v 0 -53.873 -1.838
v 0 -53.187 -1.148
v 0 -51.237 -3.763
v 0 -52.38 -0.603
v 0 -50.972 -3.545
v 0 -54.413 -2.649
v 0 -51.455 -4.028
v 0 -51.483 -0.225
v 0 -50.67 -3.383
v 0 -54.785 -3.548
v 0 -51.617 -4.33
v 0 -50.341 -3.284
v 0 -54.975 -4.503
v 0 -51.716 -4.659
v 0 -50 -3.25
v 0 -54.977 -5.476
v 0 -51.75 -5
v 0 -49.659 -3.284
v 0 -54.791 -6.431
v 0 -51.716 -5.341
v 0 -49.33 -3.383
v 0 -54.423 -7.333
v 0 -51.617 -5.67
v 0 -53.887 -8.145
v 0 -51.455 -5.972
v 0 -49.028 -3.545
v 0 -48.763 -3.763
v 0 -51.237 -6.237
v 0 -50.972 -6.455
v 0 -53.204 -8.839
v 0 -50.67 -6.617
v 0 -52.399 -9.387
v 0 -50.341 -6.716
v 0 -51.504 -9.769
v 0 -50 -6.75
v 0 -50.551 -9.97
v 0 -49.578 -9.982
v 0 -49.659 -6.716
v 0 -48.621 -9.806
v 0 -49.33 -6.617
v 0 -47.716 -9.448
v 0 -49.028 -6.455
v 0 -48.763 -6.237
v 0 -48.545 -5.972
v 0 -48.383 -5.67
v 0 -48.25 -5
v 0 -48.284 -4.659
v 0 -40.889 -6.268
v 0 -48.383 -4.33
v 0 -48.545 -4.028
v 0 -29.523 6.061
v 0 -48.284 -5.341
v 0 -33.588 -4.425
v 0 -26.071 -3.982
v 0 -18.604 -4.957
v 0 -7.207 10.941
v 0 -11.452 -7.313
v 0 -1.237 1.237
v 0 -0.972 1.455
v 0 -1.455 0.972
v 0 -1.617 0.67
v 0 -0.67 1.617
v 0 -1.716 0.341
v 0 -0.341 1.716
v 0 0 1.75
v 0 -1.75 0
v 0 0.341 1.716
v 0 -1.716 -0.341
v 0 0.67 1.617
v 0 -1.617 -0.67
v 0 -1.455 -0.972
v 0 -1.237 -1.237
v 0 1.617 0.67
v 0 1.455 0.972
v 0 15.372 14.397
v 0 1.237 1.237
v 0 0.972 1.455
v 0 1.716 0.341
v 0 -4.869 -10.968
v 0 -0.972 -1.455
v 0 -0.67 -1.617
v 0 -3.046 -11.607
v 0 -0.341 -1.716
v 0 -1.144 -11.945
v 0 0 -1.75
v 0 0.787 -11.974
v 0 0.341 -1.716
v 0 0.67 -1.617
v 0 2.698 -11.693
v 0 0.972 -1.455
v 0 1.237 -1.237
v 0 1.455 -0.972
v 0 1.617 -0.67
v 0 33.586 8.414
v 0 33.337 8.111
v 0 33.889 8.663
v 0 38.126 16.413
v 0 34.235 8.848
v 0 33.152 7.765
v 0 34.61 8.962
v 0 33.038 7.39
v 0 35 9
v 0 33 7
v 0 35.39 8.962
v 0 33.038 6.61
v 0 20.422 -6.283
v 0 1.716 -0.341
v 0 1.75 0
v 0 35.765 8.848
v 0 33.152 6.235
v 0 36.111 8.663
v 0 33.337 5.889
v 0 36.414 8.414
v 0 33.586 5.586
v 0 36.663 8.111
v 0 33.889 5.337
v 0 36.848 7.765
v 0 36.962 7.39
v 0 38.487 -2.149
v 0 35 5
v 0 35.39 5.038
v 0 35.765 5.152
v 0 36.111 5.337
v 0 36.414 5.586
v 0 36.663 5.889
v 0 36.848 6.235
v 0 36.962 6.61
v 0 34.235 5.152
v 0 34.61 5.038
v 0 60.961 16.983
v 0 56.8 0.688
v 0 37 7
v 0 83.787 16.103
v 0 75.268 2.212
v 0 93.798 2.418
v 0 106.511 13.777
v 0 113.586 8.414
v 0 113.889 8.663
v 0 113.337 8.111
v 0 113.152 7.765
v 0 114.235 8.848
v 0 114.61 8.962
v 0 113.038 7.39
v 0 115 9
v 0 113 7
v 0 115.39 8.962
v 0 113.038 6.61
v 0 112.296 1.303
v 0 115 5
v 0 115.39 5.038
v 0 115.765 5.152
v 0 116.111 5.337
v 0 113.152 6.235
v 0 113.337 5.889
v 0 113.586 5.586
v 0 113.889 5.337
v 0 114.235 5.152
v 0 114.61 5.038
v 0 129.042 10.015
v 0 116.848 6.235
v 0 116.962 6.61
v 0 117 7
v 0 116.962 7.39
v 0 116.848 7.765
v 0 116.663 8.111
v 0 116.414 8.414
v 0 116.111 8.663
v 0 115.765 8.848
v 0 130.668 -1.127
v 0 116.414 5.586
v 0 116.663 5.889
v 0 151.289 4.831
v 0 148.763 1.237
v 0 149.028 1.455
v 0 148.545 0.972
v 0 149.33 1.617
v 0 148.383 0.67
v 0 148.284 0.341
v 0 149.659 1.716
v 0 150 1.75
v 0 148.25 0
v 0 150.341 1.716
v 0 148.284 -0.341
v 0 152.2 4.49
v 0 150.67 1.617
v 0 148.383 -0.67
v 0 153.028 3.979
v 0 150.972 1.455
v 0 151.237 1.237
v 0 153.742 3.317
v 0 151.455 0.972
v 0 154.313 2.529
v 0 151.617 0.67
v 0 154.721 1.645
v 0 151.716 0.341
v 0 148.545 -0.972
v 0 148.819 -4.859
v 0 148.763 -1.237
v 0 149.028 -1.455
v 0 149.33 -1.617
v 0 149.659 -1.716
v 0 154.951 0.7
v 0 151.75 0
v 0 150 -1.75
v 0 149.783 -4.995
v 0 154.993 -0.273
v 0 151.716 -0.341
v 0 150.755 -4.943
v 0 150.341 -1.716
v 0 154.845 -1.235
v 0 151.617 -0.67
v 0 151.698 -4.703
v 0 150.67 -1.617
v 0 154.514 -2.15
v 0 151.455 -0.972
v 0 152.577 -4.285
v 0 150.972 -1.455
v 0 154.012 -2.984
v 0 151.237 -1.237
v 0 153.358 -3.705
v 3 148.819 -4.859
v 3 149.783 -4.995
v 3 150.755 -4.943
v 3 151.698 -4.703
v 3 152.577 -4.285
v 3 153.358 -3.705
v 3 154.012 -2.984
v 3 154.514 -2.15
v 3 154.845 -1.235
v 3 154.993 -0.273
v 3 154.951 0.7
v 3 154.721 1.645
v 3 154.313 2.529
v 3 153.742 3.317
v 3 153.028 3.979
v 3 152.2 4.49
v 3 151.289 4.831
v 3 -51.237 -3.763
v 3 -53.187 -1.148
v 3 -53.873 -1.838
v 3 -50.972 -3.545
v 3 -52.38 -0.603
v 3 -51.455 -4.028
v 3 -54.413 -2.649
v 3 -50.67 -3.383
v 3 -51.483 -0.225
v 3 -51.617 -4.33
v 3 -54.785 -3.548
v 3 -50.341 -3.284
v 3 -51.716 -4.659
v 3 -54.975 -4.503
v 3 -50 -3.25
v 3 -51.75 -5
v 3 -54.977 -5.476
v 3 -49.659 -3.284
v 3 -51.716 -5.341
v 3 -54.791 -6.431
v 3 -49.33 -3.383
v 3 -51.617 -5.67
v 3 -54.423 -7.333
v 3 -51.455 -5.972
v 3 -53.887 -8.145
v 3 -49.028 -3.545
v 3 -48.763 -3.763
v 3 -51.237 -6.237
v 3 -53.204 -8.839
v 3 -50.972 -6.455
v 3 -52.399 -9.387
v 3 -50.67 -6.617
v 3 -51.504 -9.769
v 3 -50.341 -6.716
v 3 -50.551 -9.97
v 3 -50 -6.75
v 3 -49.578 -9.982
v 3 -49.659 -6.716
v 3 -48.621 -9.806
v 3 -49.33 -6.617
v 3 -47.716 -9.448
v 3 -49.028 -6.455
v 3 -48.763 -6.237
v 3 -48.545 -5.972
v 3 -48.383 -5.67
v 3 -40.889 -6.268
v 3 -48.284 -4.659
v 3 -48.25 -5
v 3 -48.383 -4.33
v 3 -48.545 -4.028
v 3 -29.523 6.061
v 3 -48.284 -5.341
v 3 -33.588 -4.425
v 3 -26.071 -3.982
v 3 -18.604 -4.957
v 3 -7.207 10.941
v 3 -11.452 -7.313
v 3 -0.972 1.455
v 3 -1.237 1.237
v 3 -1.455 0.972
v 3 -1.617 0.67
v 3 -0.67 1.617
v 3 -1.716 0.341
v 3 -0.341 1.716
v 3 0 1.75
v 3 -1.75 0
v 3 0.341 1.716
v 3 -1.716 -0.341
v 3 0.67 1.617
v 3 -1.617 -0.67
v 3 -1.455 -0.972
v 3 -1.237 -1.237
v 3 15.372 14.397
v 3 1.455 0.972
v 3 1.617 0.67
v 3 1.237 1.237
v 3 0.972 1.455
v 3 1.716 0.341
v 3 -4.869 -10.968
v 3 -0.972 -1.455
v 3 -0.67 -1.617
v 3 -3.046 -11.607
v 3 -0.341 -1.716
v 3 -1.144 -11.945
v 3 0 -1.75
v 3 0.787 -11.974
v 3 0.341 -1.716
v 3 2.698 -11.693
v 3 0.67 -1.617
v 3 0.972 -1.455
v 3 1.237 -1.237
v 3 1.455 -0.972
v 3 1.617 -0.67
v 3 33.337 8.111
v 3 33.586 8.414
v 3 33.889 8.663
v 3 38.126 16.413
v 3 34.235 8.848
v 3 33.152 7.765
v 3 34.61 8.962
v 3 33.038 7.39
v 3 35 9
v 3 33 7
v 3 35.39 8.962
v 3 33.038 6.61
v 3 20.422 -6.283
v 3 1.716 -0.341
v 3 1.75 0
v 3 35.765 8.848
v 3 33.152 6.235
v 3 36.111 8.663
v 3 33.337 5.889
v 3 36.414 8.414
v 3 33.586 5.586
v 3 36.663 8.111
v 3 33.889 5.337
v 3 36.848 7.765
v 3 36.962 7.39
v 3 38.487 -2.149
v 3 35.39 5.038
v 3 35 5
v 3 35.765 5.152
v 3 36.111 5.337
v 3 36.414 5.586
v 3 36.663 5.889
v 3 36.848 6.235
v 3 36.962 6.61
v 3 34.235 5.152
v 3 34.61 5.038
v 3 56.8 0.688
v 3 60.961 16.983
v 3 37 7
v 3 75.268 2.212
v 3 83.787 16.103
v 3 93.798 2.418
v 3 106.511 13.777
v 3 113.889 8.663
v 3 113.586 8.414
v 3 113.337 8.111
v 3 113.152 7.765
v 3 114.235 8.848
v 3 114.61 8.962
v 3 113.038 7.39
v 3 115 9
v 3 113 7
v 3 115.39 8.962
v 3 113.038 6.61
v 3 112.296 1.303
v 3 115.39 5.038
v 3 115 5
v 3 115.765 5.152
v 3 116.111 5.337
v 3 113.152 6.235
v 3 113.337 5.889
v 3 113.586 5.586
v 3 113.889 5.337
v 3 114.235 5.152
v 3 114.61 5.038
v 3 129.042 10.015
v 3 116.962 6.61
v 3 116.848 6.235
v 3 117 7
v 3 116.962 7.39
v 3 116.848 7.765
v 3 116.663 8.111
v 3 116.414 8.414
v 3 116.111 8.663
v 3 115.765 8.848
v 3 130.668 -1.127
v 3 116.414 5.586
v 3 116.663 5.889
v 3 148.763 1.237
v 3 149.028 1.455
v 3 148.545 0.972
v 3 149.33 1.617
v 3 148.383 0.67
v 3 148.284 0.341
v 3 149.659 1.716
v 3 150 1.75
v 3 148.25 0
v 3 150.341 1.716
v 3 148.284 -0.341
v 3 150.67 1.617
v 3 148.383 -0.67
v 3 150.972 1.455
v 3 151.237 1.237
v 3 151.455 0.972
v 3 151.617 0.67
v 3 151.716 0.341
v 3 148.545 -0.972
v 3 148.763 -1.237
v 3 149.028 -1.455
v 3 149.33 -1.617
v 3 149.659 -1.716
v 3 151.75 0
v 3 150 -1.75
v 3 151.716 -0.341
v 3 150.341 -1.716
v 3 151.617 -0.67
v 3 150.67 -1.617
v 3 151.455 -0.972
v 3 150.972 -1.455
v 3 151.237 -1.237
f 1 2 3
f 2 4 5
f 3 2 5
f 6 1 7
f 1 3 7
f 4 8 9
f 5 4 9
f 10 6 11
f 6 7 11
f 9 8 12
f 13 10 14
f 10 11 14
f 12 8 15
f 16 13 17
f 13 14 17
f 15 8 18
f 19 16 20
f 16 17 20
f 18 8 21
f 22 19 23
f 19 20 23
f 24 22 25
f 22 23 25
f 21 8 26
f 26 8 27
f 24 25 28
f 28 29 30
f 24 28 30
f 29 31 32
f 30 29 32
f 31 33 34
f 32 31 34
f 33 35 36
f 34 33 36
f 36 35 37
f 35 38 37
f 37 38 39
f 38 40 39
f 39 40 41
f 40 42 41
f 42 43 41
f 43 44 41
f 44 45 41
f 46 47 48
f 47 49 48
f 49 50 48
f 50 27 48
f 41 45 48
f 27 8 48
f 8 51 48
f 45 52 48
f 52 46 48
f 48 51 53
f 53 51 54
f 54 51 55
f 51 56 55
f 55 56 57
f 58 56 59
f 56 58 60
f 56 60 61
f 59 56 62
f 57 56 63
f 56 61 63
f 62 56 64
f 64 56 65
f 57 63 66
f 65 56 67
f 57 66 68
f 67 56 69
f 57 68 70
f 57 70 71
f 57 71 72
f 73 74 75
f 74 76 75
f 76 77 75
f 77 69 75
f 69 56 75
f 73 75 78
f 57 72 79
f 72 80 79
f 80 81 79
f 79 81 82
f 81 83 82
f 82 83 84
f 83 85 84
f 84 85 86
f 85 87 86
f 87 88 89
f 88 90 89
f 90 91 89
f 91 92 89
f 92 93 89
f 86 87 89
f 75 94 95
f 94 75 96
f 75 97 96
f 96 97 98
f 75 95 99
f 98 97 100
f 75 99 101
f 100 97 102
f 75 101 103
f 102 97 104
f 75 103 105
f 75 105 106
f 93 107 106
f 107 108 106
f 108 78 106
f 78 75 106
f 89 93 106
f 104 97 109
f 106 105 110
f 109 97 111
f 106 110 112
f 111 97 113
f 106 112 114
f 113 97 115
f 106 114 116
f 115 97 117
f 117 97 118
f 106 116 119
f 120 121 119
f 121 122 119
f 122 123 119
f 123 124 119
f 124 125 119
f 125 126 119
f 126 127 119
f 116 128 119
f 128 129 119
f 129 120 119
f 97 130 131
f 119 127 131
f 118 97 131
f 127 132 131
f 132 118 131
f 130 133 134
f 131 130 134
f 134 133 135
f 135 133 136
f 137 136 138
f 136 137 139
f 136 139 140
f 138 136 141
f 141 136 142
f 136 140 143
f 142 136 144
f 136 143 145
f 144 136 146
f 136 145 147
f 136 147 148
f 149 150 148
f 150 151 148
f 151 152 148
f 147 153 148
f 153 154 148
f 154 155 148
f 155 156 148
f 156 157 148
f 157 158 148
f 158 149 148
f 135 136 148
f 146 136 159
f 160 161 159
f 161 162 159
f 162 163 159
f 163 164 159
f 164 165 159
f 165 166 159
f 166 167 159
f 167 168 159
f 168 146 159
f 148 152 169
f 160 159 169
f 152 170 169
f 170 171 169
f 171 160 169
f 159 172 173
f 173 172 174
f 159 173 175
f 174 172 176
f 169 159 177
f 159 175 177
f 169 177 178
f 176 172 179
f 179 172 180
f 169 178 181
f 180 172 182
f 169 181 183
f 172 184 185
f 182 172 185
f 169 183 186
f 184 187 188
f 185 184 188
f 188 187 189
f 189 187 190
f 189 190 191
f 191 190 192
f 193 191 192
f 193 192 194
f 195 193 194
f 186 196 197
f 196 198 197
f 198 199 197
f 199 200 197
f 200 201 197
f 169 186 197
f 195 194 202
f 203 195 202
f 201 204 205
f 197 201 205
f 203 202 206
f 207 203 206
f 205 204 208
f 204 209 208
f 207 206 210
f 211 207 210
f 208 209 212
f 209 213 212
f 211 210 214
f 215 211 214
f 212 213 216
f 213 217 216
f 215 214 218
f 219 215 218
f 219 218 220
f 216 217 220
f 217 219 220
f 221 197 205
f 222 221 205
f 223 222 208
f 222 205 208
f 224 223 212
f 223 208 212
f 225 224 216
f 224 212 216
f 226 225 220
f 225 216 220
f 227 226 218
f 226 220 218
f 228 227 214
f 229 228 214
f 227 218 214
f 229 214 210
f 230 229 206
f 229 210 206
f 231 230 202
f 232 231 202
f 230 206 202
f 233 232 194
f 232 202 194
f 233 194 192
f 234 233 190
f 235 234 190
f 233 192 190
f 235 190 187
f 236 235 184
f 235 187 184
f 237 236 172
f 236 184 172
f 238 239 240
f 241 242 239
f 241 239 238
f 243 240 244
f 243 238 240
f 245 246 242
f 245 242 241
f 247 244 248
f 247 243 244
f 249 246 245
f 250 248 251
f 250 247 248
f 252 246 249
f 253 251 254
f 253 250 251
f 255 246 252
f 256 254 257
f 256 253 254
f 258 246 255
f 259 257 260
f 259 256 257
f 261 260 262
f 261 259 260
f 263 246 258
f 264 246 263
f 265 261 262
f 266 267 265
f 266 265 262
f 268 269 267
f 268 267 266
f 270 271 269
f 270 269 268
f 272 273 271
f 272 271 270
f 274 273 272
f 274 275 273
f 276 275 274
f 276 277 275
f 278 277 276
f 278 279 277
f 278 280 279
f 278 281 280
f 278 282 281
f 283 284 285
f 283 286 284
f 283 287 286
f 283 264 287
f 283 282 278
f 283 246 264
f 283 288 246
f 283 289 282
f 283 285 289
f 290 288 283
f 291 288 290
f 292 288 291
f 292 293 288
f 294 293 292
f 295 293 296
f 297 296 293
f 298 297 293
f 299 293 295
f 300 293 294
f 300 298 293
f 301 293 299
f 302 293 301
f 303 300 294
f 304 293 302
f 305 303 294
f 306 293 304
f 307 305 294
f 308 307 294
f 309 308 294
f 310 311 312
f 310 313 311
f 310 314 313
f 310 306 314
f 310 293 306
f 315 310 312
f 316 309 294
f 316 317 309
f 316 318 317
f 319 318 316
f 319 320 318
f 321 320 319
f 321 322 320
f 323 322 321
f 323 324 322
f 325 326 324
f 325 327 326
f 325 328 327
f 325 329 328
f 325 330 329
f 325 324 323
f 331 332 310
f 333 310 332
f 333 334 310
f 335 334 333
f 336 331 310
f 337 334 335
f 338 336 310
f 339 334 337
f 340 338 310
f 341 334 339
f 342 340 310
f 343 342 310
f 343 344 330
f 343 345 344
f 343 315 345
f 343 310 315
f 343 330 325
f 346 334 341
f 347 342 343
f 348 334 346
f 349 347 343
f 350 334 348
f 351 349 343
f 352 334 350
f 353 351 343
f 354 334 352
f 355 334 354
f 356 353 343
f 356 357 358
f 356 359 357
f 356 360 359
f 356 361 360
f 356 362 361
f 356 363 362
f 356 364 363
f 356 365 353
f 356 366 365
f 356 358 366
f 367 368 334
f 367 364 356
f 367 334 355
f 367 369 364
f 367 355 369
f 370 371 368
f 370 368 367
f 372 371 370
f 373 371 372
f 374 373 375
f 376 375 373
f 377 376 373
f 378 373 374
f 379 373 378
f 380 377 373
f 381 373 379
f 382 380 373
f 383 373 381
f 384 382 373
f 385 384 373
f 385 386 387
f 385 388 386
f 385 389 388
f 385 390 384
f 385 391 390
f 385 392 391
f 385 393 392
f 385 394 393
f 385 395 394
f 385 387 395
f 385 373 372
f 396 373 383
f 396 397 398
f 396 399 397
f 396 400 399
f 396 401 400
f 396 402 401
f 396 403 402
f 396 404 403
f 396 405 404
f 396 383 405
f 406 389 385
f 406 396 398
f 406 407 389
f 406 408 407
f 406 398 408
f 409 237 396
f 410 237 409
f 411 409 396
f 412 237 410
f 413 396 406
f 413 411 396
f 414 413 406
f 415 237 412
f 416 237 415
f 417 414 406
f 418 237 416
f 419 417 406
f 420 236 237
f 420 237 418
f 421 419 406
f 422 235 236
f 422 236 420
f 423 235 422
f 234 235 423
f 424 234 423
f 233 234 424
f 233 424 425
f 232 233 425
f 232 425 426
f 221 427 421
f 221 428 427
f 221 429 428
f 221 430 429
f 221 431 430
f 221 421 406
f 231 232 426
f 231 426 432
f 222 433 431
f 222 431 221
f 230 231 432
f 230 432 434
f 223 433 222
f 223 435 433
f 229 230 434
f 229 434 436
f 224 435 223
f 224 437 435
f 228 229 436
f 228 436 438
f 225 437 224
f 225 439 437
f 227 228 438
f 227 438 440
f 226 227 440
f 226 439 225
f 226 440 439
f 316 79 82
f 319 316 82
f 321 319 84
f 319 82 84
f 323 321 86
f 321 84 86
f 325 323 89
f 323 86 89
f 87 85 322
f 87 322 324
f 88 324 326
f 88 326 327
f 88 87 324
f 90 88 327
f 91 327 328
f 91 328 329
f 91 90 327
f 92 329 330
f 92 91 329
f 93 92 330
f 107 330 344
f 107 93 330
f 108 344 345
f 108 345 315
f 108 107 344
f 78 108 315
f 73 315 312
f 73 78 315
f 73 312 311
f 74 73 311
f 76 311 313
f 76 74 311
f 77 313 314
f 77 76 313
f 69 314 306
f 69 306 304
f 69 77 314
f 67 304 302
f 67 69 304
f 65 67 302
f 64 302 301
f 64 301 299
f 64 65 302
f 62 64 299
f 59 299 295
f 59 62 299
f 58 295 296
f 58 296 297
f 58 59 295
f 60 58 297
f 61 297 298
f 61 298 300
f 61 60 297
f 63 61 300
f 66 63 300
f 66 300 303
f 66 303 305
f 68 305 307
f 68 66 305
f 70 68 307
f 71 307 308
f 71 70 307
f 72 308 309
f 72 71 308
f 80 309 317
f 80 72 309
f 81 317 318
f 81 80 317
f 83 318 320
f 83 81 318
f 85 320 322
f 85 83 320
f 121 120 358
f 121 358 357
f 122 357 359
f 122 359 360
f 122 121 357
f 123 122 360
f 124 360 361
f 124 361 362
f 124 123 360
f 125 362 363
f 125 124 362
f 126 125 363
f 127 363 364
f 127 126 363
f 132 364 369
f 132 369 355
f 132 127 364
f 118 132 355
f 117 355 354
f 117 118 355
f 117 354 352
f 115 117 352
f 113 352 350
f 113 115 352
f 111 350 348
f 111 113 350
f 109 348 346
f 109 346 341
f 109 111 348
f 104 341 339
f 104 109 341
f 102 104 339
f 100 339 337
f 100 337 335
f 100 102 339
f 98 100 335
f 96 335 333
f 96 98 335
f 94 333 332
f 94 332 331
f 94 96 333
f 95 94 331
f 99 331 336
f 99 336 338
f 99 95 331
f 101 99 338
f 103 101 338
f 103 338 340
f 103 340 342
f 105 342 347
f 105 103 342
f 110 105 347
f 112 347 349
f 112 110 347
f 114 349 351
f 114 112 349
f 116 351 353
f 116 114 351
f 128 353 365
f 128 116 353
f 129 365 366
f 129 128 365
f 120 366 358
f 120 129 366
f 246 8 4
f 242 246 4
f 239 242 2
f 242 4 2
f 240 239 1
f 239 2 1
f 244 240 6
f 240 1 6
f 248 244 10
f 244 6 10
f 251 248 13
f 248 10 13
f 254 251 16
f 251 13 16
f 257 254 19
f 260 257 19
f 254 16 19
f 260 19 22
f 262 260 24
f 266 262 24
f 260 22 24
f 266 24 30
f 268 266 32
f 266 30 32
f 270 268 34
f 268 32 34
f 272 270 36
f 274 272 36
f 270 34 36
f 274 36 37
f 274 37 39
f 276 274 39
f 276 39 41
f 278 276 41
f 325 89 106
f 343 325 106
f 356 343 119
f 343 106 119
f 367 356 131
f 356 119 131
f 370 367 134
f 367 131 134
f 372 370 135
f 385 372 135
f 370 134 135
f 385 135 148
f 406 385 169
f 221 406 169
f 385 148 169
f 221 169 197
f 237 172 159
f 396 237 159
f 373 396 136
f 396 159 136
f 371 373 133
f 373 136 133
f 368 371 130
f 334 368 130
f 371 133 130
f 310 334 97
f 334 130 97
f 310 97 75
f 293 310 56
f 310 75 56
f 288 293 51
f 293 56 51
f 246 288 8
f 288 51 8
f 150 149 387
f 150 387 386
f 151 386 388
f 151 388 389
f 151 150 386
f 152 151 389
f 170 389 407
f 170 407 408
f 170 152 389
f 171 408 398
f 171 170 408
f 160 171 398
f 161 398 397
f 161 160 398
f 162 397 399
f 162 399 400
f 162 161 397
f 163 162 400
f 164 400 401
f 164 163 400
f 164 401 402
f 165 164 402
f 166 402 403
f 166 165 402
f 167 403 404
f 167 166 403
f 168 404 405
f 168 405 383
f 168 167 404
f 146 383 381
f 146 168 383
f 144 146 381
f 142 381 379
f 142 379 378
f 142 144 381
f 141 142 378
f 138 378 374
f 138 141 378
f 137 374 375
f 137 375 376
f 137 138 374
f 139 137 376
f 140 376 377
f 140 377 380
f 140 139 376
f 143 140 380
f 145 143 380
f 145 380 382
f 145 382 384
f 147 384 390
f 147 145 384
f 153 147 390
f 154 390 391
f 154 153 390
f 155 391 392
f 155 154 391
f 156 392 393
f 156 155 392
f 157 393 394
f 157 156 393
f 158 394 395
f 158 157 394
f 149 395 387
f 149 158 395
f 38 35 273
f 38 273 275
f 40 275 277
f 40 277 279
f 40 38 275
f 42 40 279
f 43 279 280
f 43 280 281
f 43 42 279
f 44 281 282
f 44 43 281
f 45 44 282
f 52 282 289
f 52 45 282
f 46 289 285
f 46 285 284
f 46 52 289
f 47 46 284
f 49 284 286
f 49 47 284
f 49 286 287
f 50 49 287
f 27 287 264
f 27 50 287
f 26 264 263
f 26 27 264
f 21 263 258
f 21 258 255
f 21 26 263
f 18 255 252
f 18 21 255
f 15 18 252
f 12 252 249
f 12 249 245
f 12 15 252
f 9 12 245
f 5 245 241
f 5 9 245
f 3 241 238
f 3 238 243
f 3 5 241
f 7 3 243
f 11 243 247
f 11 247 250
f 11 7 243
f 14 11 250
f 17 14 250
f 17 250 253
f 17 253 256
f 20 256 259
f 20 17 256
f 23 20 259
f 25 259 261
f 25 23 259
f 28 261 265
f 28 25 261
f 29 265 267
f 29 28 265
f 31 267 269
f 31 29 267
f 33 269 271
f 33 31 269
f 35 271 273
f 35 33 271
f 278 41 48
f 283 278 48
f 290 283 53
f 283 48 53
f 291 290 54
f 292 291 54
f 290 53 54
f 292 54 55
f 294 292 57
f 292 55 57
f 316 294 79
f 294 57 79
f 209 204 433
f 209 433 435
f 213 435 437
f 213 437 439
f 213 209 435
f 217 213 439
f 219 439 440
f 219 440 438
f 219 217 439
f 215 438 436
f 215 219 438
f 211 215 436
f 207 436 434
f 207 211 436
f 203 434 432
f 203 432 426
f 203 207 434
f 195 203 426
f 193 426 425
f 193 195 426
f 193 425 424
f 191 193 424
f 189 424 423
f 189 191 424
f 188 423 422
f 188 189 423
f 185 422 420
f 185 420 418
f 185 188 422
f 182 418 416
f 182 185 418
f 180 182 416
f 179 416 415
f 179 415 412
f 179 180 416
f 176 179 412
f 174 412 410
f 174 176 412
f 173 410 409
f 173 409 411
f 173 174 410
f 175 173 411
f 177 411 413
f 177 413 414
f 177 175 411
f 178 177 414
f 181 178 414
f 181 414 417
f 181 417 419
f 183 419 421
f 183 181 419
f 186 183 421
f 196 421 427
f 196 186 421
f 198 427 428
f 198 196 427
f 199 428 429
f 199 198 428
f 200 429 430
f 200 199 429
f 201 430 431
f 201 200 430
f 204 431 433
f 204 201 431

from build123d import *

# Parameters (mm, degrees)
CROQUIS1_R              = 1.75
CROQUIS1_R_2            = 2
SALIENTE_EXTRUIR1_DEPTH = 3


with BuildPart() as part:
    # Croquis1 → Saliente-Extruir1 (new body)
    with BuildSketch(Plane(origin=(0, 0, 0), x_dir=(0, 0, -1), z_dir=(1, 0, 0))):
        with BuildLine():
            ThreePointArc((0.225128417, -51.483442404), (6.890995422, -54.628621427), (9.447658726, -47.71563316))
            ThreePointArc((9.447658726, -47.71563316), (3.98237778, -26.07129422), (10.967929509, -4.868729021))
            ThreePointArc((10.967929509, -4.868729021), (11.945328824, -1.144167506), (11.692718634, 2.698208841))
            ThreePointArc((11.692718634, 2.698208841), (-2.21241308, 75.268149846), (4.858559991, 148.819155042))
            ThreePointArc((4.858559991, 148.819155042), (1.234772605, 154.845135355), (-4.831112169, 151.288547713))
            ThreePointArc((-4.831112169, 151.288547713), (-16.879167042, 49.539087028), (0.225128417, -51.483442404))
        make_face()
        with Locations((5, -50)):
            Circle(CROQUIS1_R, mode=Mode.SUBTRACT)
        with Locations((0, 150)):
            Circle(CROQUIS1_R, mode=Mode.SUBTRACT)
        Circle(CROQUIS1_R, mode=Mode.SUBTRACT)
        with Locations((-7, 35)):
            Circle(CROQUIS1_R_2, mode=Mode.SUBTRACT)
        with Locations((-7, 115)):
            Circle(CROQUIS1_R_2, mode=Mode.SUBTRACT)
    extrude(amount=SALIENTE_EXTRUIR1_DEPTH)


solid = part.part
